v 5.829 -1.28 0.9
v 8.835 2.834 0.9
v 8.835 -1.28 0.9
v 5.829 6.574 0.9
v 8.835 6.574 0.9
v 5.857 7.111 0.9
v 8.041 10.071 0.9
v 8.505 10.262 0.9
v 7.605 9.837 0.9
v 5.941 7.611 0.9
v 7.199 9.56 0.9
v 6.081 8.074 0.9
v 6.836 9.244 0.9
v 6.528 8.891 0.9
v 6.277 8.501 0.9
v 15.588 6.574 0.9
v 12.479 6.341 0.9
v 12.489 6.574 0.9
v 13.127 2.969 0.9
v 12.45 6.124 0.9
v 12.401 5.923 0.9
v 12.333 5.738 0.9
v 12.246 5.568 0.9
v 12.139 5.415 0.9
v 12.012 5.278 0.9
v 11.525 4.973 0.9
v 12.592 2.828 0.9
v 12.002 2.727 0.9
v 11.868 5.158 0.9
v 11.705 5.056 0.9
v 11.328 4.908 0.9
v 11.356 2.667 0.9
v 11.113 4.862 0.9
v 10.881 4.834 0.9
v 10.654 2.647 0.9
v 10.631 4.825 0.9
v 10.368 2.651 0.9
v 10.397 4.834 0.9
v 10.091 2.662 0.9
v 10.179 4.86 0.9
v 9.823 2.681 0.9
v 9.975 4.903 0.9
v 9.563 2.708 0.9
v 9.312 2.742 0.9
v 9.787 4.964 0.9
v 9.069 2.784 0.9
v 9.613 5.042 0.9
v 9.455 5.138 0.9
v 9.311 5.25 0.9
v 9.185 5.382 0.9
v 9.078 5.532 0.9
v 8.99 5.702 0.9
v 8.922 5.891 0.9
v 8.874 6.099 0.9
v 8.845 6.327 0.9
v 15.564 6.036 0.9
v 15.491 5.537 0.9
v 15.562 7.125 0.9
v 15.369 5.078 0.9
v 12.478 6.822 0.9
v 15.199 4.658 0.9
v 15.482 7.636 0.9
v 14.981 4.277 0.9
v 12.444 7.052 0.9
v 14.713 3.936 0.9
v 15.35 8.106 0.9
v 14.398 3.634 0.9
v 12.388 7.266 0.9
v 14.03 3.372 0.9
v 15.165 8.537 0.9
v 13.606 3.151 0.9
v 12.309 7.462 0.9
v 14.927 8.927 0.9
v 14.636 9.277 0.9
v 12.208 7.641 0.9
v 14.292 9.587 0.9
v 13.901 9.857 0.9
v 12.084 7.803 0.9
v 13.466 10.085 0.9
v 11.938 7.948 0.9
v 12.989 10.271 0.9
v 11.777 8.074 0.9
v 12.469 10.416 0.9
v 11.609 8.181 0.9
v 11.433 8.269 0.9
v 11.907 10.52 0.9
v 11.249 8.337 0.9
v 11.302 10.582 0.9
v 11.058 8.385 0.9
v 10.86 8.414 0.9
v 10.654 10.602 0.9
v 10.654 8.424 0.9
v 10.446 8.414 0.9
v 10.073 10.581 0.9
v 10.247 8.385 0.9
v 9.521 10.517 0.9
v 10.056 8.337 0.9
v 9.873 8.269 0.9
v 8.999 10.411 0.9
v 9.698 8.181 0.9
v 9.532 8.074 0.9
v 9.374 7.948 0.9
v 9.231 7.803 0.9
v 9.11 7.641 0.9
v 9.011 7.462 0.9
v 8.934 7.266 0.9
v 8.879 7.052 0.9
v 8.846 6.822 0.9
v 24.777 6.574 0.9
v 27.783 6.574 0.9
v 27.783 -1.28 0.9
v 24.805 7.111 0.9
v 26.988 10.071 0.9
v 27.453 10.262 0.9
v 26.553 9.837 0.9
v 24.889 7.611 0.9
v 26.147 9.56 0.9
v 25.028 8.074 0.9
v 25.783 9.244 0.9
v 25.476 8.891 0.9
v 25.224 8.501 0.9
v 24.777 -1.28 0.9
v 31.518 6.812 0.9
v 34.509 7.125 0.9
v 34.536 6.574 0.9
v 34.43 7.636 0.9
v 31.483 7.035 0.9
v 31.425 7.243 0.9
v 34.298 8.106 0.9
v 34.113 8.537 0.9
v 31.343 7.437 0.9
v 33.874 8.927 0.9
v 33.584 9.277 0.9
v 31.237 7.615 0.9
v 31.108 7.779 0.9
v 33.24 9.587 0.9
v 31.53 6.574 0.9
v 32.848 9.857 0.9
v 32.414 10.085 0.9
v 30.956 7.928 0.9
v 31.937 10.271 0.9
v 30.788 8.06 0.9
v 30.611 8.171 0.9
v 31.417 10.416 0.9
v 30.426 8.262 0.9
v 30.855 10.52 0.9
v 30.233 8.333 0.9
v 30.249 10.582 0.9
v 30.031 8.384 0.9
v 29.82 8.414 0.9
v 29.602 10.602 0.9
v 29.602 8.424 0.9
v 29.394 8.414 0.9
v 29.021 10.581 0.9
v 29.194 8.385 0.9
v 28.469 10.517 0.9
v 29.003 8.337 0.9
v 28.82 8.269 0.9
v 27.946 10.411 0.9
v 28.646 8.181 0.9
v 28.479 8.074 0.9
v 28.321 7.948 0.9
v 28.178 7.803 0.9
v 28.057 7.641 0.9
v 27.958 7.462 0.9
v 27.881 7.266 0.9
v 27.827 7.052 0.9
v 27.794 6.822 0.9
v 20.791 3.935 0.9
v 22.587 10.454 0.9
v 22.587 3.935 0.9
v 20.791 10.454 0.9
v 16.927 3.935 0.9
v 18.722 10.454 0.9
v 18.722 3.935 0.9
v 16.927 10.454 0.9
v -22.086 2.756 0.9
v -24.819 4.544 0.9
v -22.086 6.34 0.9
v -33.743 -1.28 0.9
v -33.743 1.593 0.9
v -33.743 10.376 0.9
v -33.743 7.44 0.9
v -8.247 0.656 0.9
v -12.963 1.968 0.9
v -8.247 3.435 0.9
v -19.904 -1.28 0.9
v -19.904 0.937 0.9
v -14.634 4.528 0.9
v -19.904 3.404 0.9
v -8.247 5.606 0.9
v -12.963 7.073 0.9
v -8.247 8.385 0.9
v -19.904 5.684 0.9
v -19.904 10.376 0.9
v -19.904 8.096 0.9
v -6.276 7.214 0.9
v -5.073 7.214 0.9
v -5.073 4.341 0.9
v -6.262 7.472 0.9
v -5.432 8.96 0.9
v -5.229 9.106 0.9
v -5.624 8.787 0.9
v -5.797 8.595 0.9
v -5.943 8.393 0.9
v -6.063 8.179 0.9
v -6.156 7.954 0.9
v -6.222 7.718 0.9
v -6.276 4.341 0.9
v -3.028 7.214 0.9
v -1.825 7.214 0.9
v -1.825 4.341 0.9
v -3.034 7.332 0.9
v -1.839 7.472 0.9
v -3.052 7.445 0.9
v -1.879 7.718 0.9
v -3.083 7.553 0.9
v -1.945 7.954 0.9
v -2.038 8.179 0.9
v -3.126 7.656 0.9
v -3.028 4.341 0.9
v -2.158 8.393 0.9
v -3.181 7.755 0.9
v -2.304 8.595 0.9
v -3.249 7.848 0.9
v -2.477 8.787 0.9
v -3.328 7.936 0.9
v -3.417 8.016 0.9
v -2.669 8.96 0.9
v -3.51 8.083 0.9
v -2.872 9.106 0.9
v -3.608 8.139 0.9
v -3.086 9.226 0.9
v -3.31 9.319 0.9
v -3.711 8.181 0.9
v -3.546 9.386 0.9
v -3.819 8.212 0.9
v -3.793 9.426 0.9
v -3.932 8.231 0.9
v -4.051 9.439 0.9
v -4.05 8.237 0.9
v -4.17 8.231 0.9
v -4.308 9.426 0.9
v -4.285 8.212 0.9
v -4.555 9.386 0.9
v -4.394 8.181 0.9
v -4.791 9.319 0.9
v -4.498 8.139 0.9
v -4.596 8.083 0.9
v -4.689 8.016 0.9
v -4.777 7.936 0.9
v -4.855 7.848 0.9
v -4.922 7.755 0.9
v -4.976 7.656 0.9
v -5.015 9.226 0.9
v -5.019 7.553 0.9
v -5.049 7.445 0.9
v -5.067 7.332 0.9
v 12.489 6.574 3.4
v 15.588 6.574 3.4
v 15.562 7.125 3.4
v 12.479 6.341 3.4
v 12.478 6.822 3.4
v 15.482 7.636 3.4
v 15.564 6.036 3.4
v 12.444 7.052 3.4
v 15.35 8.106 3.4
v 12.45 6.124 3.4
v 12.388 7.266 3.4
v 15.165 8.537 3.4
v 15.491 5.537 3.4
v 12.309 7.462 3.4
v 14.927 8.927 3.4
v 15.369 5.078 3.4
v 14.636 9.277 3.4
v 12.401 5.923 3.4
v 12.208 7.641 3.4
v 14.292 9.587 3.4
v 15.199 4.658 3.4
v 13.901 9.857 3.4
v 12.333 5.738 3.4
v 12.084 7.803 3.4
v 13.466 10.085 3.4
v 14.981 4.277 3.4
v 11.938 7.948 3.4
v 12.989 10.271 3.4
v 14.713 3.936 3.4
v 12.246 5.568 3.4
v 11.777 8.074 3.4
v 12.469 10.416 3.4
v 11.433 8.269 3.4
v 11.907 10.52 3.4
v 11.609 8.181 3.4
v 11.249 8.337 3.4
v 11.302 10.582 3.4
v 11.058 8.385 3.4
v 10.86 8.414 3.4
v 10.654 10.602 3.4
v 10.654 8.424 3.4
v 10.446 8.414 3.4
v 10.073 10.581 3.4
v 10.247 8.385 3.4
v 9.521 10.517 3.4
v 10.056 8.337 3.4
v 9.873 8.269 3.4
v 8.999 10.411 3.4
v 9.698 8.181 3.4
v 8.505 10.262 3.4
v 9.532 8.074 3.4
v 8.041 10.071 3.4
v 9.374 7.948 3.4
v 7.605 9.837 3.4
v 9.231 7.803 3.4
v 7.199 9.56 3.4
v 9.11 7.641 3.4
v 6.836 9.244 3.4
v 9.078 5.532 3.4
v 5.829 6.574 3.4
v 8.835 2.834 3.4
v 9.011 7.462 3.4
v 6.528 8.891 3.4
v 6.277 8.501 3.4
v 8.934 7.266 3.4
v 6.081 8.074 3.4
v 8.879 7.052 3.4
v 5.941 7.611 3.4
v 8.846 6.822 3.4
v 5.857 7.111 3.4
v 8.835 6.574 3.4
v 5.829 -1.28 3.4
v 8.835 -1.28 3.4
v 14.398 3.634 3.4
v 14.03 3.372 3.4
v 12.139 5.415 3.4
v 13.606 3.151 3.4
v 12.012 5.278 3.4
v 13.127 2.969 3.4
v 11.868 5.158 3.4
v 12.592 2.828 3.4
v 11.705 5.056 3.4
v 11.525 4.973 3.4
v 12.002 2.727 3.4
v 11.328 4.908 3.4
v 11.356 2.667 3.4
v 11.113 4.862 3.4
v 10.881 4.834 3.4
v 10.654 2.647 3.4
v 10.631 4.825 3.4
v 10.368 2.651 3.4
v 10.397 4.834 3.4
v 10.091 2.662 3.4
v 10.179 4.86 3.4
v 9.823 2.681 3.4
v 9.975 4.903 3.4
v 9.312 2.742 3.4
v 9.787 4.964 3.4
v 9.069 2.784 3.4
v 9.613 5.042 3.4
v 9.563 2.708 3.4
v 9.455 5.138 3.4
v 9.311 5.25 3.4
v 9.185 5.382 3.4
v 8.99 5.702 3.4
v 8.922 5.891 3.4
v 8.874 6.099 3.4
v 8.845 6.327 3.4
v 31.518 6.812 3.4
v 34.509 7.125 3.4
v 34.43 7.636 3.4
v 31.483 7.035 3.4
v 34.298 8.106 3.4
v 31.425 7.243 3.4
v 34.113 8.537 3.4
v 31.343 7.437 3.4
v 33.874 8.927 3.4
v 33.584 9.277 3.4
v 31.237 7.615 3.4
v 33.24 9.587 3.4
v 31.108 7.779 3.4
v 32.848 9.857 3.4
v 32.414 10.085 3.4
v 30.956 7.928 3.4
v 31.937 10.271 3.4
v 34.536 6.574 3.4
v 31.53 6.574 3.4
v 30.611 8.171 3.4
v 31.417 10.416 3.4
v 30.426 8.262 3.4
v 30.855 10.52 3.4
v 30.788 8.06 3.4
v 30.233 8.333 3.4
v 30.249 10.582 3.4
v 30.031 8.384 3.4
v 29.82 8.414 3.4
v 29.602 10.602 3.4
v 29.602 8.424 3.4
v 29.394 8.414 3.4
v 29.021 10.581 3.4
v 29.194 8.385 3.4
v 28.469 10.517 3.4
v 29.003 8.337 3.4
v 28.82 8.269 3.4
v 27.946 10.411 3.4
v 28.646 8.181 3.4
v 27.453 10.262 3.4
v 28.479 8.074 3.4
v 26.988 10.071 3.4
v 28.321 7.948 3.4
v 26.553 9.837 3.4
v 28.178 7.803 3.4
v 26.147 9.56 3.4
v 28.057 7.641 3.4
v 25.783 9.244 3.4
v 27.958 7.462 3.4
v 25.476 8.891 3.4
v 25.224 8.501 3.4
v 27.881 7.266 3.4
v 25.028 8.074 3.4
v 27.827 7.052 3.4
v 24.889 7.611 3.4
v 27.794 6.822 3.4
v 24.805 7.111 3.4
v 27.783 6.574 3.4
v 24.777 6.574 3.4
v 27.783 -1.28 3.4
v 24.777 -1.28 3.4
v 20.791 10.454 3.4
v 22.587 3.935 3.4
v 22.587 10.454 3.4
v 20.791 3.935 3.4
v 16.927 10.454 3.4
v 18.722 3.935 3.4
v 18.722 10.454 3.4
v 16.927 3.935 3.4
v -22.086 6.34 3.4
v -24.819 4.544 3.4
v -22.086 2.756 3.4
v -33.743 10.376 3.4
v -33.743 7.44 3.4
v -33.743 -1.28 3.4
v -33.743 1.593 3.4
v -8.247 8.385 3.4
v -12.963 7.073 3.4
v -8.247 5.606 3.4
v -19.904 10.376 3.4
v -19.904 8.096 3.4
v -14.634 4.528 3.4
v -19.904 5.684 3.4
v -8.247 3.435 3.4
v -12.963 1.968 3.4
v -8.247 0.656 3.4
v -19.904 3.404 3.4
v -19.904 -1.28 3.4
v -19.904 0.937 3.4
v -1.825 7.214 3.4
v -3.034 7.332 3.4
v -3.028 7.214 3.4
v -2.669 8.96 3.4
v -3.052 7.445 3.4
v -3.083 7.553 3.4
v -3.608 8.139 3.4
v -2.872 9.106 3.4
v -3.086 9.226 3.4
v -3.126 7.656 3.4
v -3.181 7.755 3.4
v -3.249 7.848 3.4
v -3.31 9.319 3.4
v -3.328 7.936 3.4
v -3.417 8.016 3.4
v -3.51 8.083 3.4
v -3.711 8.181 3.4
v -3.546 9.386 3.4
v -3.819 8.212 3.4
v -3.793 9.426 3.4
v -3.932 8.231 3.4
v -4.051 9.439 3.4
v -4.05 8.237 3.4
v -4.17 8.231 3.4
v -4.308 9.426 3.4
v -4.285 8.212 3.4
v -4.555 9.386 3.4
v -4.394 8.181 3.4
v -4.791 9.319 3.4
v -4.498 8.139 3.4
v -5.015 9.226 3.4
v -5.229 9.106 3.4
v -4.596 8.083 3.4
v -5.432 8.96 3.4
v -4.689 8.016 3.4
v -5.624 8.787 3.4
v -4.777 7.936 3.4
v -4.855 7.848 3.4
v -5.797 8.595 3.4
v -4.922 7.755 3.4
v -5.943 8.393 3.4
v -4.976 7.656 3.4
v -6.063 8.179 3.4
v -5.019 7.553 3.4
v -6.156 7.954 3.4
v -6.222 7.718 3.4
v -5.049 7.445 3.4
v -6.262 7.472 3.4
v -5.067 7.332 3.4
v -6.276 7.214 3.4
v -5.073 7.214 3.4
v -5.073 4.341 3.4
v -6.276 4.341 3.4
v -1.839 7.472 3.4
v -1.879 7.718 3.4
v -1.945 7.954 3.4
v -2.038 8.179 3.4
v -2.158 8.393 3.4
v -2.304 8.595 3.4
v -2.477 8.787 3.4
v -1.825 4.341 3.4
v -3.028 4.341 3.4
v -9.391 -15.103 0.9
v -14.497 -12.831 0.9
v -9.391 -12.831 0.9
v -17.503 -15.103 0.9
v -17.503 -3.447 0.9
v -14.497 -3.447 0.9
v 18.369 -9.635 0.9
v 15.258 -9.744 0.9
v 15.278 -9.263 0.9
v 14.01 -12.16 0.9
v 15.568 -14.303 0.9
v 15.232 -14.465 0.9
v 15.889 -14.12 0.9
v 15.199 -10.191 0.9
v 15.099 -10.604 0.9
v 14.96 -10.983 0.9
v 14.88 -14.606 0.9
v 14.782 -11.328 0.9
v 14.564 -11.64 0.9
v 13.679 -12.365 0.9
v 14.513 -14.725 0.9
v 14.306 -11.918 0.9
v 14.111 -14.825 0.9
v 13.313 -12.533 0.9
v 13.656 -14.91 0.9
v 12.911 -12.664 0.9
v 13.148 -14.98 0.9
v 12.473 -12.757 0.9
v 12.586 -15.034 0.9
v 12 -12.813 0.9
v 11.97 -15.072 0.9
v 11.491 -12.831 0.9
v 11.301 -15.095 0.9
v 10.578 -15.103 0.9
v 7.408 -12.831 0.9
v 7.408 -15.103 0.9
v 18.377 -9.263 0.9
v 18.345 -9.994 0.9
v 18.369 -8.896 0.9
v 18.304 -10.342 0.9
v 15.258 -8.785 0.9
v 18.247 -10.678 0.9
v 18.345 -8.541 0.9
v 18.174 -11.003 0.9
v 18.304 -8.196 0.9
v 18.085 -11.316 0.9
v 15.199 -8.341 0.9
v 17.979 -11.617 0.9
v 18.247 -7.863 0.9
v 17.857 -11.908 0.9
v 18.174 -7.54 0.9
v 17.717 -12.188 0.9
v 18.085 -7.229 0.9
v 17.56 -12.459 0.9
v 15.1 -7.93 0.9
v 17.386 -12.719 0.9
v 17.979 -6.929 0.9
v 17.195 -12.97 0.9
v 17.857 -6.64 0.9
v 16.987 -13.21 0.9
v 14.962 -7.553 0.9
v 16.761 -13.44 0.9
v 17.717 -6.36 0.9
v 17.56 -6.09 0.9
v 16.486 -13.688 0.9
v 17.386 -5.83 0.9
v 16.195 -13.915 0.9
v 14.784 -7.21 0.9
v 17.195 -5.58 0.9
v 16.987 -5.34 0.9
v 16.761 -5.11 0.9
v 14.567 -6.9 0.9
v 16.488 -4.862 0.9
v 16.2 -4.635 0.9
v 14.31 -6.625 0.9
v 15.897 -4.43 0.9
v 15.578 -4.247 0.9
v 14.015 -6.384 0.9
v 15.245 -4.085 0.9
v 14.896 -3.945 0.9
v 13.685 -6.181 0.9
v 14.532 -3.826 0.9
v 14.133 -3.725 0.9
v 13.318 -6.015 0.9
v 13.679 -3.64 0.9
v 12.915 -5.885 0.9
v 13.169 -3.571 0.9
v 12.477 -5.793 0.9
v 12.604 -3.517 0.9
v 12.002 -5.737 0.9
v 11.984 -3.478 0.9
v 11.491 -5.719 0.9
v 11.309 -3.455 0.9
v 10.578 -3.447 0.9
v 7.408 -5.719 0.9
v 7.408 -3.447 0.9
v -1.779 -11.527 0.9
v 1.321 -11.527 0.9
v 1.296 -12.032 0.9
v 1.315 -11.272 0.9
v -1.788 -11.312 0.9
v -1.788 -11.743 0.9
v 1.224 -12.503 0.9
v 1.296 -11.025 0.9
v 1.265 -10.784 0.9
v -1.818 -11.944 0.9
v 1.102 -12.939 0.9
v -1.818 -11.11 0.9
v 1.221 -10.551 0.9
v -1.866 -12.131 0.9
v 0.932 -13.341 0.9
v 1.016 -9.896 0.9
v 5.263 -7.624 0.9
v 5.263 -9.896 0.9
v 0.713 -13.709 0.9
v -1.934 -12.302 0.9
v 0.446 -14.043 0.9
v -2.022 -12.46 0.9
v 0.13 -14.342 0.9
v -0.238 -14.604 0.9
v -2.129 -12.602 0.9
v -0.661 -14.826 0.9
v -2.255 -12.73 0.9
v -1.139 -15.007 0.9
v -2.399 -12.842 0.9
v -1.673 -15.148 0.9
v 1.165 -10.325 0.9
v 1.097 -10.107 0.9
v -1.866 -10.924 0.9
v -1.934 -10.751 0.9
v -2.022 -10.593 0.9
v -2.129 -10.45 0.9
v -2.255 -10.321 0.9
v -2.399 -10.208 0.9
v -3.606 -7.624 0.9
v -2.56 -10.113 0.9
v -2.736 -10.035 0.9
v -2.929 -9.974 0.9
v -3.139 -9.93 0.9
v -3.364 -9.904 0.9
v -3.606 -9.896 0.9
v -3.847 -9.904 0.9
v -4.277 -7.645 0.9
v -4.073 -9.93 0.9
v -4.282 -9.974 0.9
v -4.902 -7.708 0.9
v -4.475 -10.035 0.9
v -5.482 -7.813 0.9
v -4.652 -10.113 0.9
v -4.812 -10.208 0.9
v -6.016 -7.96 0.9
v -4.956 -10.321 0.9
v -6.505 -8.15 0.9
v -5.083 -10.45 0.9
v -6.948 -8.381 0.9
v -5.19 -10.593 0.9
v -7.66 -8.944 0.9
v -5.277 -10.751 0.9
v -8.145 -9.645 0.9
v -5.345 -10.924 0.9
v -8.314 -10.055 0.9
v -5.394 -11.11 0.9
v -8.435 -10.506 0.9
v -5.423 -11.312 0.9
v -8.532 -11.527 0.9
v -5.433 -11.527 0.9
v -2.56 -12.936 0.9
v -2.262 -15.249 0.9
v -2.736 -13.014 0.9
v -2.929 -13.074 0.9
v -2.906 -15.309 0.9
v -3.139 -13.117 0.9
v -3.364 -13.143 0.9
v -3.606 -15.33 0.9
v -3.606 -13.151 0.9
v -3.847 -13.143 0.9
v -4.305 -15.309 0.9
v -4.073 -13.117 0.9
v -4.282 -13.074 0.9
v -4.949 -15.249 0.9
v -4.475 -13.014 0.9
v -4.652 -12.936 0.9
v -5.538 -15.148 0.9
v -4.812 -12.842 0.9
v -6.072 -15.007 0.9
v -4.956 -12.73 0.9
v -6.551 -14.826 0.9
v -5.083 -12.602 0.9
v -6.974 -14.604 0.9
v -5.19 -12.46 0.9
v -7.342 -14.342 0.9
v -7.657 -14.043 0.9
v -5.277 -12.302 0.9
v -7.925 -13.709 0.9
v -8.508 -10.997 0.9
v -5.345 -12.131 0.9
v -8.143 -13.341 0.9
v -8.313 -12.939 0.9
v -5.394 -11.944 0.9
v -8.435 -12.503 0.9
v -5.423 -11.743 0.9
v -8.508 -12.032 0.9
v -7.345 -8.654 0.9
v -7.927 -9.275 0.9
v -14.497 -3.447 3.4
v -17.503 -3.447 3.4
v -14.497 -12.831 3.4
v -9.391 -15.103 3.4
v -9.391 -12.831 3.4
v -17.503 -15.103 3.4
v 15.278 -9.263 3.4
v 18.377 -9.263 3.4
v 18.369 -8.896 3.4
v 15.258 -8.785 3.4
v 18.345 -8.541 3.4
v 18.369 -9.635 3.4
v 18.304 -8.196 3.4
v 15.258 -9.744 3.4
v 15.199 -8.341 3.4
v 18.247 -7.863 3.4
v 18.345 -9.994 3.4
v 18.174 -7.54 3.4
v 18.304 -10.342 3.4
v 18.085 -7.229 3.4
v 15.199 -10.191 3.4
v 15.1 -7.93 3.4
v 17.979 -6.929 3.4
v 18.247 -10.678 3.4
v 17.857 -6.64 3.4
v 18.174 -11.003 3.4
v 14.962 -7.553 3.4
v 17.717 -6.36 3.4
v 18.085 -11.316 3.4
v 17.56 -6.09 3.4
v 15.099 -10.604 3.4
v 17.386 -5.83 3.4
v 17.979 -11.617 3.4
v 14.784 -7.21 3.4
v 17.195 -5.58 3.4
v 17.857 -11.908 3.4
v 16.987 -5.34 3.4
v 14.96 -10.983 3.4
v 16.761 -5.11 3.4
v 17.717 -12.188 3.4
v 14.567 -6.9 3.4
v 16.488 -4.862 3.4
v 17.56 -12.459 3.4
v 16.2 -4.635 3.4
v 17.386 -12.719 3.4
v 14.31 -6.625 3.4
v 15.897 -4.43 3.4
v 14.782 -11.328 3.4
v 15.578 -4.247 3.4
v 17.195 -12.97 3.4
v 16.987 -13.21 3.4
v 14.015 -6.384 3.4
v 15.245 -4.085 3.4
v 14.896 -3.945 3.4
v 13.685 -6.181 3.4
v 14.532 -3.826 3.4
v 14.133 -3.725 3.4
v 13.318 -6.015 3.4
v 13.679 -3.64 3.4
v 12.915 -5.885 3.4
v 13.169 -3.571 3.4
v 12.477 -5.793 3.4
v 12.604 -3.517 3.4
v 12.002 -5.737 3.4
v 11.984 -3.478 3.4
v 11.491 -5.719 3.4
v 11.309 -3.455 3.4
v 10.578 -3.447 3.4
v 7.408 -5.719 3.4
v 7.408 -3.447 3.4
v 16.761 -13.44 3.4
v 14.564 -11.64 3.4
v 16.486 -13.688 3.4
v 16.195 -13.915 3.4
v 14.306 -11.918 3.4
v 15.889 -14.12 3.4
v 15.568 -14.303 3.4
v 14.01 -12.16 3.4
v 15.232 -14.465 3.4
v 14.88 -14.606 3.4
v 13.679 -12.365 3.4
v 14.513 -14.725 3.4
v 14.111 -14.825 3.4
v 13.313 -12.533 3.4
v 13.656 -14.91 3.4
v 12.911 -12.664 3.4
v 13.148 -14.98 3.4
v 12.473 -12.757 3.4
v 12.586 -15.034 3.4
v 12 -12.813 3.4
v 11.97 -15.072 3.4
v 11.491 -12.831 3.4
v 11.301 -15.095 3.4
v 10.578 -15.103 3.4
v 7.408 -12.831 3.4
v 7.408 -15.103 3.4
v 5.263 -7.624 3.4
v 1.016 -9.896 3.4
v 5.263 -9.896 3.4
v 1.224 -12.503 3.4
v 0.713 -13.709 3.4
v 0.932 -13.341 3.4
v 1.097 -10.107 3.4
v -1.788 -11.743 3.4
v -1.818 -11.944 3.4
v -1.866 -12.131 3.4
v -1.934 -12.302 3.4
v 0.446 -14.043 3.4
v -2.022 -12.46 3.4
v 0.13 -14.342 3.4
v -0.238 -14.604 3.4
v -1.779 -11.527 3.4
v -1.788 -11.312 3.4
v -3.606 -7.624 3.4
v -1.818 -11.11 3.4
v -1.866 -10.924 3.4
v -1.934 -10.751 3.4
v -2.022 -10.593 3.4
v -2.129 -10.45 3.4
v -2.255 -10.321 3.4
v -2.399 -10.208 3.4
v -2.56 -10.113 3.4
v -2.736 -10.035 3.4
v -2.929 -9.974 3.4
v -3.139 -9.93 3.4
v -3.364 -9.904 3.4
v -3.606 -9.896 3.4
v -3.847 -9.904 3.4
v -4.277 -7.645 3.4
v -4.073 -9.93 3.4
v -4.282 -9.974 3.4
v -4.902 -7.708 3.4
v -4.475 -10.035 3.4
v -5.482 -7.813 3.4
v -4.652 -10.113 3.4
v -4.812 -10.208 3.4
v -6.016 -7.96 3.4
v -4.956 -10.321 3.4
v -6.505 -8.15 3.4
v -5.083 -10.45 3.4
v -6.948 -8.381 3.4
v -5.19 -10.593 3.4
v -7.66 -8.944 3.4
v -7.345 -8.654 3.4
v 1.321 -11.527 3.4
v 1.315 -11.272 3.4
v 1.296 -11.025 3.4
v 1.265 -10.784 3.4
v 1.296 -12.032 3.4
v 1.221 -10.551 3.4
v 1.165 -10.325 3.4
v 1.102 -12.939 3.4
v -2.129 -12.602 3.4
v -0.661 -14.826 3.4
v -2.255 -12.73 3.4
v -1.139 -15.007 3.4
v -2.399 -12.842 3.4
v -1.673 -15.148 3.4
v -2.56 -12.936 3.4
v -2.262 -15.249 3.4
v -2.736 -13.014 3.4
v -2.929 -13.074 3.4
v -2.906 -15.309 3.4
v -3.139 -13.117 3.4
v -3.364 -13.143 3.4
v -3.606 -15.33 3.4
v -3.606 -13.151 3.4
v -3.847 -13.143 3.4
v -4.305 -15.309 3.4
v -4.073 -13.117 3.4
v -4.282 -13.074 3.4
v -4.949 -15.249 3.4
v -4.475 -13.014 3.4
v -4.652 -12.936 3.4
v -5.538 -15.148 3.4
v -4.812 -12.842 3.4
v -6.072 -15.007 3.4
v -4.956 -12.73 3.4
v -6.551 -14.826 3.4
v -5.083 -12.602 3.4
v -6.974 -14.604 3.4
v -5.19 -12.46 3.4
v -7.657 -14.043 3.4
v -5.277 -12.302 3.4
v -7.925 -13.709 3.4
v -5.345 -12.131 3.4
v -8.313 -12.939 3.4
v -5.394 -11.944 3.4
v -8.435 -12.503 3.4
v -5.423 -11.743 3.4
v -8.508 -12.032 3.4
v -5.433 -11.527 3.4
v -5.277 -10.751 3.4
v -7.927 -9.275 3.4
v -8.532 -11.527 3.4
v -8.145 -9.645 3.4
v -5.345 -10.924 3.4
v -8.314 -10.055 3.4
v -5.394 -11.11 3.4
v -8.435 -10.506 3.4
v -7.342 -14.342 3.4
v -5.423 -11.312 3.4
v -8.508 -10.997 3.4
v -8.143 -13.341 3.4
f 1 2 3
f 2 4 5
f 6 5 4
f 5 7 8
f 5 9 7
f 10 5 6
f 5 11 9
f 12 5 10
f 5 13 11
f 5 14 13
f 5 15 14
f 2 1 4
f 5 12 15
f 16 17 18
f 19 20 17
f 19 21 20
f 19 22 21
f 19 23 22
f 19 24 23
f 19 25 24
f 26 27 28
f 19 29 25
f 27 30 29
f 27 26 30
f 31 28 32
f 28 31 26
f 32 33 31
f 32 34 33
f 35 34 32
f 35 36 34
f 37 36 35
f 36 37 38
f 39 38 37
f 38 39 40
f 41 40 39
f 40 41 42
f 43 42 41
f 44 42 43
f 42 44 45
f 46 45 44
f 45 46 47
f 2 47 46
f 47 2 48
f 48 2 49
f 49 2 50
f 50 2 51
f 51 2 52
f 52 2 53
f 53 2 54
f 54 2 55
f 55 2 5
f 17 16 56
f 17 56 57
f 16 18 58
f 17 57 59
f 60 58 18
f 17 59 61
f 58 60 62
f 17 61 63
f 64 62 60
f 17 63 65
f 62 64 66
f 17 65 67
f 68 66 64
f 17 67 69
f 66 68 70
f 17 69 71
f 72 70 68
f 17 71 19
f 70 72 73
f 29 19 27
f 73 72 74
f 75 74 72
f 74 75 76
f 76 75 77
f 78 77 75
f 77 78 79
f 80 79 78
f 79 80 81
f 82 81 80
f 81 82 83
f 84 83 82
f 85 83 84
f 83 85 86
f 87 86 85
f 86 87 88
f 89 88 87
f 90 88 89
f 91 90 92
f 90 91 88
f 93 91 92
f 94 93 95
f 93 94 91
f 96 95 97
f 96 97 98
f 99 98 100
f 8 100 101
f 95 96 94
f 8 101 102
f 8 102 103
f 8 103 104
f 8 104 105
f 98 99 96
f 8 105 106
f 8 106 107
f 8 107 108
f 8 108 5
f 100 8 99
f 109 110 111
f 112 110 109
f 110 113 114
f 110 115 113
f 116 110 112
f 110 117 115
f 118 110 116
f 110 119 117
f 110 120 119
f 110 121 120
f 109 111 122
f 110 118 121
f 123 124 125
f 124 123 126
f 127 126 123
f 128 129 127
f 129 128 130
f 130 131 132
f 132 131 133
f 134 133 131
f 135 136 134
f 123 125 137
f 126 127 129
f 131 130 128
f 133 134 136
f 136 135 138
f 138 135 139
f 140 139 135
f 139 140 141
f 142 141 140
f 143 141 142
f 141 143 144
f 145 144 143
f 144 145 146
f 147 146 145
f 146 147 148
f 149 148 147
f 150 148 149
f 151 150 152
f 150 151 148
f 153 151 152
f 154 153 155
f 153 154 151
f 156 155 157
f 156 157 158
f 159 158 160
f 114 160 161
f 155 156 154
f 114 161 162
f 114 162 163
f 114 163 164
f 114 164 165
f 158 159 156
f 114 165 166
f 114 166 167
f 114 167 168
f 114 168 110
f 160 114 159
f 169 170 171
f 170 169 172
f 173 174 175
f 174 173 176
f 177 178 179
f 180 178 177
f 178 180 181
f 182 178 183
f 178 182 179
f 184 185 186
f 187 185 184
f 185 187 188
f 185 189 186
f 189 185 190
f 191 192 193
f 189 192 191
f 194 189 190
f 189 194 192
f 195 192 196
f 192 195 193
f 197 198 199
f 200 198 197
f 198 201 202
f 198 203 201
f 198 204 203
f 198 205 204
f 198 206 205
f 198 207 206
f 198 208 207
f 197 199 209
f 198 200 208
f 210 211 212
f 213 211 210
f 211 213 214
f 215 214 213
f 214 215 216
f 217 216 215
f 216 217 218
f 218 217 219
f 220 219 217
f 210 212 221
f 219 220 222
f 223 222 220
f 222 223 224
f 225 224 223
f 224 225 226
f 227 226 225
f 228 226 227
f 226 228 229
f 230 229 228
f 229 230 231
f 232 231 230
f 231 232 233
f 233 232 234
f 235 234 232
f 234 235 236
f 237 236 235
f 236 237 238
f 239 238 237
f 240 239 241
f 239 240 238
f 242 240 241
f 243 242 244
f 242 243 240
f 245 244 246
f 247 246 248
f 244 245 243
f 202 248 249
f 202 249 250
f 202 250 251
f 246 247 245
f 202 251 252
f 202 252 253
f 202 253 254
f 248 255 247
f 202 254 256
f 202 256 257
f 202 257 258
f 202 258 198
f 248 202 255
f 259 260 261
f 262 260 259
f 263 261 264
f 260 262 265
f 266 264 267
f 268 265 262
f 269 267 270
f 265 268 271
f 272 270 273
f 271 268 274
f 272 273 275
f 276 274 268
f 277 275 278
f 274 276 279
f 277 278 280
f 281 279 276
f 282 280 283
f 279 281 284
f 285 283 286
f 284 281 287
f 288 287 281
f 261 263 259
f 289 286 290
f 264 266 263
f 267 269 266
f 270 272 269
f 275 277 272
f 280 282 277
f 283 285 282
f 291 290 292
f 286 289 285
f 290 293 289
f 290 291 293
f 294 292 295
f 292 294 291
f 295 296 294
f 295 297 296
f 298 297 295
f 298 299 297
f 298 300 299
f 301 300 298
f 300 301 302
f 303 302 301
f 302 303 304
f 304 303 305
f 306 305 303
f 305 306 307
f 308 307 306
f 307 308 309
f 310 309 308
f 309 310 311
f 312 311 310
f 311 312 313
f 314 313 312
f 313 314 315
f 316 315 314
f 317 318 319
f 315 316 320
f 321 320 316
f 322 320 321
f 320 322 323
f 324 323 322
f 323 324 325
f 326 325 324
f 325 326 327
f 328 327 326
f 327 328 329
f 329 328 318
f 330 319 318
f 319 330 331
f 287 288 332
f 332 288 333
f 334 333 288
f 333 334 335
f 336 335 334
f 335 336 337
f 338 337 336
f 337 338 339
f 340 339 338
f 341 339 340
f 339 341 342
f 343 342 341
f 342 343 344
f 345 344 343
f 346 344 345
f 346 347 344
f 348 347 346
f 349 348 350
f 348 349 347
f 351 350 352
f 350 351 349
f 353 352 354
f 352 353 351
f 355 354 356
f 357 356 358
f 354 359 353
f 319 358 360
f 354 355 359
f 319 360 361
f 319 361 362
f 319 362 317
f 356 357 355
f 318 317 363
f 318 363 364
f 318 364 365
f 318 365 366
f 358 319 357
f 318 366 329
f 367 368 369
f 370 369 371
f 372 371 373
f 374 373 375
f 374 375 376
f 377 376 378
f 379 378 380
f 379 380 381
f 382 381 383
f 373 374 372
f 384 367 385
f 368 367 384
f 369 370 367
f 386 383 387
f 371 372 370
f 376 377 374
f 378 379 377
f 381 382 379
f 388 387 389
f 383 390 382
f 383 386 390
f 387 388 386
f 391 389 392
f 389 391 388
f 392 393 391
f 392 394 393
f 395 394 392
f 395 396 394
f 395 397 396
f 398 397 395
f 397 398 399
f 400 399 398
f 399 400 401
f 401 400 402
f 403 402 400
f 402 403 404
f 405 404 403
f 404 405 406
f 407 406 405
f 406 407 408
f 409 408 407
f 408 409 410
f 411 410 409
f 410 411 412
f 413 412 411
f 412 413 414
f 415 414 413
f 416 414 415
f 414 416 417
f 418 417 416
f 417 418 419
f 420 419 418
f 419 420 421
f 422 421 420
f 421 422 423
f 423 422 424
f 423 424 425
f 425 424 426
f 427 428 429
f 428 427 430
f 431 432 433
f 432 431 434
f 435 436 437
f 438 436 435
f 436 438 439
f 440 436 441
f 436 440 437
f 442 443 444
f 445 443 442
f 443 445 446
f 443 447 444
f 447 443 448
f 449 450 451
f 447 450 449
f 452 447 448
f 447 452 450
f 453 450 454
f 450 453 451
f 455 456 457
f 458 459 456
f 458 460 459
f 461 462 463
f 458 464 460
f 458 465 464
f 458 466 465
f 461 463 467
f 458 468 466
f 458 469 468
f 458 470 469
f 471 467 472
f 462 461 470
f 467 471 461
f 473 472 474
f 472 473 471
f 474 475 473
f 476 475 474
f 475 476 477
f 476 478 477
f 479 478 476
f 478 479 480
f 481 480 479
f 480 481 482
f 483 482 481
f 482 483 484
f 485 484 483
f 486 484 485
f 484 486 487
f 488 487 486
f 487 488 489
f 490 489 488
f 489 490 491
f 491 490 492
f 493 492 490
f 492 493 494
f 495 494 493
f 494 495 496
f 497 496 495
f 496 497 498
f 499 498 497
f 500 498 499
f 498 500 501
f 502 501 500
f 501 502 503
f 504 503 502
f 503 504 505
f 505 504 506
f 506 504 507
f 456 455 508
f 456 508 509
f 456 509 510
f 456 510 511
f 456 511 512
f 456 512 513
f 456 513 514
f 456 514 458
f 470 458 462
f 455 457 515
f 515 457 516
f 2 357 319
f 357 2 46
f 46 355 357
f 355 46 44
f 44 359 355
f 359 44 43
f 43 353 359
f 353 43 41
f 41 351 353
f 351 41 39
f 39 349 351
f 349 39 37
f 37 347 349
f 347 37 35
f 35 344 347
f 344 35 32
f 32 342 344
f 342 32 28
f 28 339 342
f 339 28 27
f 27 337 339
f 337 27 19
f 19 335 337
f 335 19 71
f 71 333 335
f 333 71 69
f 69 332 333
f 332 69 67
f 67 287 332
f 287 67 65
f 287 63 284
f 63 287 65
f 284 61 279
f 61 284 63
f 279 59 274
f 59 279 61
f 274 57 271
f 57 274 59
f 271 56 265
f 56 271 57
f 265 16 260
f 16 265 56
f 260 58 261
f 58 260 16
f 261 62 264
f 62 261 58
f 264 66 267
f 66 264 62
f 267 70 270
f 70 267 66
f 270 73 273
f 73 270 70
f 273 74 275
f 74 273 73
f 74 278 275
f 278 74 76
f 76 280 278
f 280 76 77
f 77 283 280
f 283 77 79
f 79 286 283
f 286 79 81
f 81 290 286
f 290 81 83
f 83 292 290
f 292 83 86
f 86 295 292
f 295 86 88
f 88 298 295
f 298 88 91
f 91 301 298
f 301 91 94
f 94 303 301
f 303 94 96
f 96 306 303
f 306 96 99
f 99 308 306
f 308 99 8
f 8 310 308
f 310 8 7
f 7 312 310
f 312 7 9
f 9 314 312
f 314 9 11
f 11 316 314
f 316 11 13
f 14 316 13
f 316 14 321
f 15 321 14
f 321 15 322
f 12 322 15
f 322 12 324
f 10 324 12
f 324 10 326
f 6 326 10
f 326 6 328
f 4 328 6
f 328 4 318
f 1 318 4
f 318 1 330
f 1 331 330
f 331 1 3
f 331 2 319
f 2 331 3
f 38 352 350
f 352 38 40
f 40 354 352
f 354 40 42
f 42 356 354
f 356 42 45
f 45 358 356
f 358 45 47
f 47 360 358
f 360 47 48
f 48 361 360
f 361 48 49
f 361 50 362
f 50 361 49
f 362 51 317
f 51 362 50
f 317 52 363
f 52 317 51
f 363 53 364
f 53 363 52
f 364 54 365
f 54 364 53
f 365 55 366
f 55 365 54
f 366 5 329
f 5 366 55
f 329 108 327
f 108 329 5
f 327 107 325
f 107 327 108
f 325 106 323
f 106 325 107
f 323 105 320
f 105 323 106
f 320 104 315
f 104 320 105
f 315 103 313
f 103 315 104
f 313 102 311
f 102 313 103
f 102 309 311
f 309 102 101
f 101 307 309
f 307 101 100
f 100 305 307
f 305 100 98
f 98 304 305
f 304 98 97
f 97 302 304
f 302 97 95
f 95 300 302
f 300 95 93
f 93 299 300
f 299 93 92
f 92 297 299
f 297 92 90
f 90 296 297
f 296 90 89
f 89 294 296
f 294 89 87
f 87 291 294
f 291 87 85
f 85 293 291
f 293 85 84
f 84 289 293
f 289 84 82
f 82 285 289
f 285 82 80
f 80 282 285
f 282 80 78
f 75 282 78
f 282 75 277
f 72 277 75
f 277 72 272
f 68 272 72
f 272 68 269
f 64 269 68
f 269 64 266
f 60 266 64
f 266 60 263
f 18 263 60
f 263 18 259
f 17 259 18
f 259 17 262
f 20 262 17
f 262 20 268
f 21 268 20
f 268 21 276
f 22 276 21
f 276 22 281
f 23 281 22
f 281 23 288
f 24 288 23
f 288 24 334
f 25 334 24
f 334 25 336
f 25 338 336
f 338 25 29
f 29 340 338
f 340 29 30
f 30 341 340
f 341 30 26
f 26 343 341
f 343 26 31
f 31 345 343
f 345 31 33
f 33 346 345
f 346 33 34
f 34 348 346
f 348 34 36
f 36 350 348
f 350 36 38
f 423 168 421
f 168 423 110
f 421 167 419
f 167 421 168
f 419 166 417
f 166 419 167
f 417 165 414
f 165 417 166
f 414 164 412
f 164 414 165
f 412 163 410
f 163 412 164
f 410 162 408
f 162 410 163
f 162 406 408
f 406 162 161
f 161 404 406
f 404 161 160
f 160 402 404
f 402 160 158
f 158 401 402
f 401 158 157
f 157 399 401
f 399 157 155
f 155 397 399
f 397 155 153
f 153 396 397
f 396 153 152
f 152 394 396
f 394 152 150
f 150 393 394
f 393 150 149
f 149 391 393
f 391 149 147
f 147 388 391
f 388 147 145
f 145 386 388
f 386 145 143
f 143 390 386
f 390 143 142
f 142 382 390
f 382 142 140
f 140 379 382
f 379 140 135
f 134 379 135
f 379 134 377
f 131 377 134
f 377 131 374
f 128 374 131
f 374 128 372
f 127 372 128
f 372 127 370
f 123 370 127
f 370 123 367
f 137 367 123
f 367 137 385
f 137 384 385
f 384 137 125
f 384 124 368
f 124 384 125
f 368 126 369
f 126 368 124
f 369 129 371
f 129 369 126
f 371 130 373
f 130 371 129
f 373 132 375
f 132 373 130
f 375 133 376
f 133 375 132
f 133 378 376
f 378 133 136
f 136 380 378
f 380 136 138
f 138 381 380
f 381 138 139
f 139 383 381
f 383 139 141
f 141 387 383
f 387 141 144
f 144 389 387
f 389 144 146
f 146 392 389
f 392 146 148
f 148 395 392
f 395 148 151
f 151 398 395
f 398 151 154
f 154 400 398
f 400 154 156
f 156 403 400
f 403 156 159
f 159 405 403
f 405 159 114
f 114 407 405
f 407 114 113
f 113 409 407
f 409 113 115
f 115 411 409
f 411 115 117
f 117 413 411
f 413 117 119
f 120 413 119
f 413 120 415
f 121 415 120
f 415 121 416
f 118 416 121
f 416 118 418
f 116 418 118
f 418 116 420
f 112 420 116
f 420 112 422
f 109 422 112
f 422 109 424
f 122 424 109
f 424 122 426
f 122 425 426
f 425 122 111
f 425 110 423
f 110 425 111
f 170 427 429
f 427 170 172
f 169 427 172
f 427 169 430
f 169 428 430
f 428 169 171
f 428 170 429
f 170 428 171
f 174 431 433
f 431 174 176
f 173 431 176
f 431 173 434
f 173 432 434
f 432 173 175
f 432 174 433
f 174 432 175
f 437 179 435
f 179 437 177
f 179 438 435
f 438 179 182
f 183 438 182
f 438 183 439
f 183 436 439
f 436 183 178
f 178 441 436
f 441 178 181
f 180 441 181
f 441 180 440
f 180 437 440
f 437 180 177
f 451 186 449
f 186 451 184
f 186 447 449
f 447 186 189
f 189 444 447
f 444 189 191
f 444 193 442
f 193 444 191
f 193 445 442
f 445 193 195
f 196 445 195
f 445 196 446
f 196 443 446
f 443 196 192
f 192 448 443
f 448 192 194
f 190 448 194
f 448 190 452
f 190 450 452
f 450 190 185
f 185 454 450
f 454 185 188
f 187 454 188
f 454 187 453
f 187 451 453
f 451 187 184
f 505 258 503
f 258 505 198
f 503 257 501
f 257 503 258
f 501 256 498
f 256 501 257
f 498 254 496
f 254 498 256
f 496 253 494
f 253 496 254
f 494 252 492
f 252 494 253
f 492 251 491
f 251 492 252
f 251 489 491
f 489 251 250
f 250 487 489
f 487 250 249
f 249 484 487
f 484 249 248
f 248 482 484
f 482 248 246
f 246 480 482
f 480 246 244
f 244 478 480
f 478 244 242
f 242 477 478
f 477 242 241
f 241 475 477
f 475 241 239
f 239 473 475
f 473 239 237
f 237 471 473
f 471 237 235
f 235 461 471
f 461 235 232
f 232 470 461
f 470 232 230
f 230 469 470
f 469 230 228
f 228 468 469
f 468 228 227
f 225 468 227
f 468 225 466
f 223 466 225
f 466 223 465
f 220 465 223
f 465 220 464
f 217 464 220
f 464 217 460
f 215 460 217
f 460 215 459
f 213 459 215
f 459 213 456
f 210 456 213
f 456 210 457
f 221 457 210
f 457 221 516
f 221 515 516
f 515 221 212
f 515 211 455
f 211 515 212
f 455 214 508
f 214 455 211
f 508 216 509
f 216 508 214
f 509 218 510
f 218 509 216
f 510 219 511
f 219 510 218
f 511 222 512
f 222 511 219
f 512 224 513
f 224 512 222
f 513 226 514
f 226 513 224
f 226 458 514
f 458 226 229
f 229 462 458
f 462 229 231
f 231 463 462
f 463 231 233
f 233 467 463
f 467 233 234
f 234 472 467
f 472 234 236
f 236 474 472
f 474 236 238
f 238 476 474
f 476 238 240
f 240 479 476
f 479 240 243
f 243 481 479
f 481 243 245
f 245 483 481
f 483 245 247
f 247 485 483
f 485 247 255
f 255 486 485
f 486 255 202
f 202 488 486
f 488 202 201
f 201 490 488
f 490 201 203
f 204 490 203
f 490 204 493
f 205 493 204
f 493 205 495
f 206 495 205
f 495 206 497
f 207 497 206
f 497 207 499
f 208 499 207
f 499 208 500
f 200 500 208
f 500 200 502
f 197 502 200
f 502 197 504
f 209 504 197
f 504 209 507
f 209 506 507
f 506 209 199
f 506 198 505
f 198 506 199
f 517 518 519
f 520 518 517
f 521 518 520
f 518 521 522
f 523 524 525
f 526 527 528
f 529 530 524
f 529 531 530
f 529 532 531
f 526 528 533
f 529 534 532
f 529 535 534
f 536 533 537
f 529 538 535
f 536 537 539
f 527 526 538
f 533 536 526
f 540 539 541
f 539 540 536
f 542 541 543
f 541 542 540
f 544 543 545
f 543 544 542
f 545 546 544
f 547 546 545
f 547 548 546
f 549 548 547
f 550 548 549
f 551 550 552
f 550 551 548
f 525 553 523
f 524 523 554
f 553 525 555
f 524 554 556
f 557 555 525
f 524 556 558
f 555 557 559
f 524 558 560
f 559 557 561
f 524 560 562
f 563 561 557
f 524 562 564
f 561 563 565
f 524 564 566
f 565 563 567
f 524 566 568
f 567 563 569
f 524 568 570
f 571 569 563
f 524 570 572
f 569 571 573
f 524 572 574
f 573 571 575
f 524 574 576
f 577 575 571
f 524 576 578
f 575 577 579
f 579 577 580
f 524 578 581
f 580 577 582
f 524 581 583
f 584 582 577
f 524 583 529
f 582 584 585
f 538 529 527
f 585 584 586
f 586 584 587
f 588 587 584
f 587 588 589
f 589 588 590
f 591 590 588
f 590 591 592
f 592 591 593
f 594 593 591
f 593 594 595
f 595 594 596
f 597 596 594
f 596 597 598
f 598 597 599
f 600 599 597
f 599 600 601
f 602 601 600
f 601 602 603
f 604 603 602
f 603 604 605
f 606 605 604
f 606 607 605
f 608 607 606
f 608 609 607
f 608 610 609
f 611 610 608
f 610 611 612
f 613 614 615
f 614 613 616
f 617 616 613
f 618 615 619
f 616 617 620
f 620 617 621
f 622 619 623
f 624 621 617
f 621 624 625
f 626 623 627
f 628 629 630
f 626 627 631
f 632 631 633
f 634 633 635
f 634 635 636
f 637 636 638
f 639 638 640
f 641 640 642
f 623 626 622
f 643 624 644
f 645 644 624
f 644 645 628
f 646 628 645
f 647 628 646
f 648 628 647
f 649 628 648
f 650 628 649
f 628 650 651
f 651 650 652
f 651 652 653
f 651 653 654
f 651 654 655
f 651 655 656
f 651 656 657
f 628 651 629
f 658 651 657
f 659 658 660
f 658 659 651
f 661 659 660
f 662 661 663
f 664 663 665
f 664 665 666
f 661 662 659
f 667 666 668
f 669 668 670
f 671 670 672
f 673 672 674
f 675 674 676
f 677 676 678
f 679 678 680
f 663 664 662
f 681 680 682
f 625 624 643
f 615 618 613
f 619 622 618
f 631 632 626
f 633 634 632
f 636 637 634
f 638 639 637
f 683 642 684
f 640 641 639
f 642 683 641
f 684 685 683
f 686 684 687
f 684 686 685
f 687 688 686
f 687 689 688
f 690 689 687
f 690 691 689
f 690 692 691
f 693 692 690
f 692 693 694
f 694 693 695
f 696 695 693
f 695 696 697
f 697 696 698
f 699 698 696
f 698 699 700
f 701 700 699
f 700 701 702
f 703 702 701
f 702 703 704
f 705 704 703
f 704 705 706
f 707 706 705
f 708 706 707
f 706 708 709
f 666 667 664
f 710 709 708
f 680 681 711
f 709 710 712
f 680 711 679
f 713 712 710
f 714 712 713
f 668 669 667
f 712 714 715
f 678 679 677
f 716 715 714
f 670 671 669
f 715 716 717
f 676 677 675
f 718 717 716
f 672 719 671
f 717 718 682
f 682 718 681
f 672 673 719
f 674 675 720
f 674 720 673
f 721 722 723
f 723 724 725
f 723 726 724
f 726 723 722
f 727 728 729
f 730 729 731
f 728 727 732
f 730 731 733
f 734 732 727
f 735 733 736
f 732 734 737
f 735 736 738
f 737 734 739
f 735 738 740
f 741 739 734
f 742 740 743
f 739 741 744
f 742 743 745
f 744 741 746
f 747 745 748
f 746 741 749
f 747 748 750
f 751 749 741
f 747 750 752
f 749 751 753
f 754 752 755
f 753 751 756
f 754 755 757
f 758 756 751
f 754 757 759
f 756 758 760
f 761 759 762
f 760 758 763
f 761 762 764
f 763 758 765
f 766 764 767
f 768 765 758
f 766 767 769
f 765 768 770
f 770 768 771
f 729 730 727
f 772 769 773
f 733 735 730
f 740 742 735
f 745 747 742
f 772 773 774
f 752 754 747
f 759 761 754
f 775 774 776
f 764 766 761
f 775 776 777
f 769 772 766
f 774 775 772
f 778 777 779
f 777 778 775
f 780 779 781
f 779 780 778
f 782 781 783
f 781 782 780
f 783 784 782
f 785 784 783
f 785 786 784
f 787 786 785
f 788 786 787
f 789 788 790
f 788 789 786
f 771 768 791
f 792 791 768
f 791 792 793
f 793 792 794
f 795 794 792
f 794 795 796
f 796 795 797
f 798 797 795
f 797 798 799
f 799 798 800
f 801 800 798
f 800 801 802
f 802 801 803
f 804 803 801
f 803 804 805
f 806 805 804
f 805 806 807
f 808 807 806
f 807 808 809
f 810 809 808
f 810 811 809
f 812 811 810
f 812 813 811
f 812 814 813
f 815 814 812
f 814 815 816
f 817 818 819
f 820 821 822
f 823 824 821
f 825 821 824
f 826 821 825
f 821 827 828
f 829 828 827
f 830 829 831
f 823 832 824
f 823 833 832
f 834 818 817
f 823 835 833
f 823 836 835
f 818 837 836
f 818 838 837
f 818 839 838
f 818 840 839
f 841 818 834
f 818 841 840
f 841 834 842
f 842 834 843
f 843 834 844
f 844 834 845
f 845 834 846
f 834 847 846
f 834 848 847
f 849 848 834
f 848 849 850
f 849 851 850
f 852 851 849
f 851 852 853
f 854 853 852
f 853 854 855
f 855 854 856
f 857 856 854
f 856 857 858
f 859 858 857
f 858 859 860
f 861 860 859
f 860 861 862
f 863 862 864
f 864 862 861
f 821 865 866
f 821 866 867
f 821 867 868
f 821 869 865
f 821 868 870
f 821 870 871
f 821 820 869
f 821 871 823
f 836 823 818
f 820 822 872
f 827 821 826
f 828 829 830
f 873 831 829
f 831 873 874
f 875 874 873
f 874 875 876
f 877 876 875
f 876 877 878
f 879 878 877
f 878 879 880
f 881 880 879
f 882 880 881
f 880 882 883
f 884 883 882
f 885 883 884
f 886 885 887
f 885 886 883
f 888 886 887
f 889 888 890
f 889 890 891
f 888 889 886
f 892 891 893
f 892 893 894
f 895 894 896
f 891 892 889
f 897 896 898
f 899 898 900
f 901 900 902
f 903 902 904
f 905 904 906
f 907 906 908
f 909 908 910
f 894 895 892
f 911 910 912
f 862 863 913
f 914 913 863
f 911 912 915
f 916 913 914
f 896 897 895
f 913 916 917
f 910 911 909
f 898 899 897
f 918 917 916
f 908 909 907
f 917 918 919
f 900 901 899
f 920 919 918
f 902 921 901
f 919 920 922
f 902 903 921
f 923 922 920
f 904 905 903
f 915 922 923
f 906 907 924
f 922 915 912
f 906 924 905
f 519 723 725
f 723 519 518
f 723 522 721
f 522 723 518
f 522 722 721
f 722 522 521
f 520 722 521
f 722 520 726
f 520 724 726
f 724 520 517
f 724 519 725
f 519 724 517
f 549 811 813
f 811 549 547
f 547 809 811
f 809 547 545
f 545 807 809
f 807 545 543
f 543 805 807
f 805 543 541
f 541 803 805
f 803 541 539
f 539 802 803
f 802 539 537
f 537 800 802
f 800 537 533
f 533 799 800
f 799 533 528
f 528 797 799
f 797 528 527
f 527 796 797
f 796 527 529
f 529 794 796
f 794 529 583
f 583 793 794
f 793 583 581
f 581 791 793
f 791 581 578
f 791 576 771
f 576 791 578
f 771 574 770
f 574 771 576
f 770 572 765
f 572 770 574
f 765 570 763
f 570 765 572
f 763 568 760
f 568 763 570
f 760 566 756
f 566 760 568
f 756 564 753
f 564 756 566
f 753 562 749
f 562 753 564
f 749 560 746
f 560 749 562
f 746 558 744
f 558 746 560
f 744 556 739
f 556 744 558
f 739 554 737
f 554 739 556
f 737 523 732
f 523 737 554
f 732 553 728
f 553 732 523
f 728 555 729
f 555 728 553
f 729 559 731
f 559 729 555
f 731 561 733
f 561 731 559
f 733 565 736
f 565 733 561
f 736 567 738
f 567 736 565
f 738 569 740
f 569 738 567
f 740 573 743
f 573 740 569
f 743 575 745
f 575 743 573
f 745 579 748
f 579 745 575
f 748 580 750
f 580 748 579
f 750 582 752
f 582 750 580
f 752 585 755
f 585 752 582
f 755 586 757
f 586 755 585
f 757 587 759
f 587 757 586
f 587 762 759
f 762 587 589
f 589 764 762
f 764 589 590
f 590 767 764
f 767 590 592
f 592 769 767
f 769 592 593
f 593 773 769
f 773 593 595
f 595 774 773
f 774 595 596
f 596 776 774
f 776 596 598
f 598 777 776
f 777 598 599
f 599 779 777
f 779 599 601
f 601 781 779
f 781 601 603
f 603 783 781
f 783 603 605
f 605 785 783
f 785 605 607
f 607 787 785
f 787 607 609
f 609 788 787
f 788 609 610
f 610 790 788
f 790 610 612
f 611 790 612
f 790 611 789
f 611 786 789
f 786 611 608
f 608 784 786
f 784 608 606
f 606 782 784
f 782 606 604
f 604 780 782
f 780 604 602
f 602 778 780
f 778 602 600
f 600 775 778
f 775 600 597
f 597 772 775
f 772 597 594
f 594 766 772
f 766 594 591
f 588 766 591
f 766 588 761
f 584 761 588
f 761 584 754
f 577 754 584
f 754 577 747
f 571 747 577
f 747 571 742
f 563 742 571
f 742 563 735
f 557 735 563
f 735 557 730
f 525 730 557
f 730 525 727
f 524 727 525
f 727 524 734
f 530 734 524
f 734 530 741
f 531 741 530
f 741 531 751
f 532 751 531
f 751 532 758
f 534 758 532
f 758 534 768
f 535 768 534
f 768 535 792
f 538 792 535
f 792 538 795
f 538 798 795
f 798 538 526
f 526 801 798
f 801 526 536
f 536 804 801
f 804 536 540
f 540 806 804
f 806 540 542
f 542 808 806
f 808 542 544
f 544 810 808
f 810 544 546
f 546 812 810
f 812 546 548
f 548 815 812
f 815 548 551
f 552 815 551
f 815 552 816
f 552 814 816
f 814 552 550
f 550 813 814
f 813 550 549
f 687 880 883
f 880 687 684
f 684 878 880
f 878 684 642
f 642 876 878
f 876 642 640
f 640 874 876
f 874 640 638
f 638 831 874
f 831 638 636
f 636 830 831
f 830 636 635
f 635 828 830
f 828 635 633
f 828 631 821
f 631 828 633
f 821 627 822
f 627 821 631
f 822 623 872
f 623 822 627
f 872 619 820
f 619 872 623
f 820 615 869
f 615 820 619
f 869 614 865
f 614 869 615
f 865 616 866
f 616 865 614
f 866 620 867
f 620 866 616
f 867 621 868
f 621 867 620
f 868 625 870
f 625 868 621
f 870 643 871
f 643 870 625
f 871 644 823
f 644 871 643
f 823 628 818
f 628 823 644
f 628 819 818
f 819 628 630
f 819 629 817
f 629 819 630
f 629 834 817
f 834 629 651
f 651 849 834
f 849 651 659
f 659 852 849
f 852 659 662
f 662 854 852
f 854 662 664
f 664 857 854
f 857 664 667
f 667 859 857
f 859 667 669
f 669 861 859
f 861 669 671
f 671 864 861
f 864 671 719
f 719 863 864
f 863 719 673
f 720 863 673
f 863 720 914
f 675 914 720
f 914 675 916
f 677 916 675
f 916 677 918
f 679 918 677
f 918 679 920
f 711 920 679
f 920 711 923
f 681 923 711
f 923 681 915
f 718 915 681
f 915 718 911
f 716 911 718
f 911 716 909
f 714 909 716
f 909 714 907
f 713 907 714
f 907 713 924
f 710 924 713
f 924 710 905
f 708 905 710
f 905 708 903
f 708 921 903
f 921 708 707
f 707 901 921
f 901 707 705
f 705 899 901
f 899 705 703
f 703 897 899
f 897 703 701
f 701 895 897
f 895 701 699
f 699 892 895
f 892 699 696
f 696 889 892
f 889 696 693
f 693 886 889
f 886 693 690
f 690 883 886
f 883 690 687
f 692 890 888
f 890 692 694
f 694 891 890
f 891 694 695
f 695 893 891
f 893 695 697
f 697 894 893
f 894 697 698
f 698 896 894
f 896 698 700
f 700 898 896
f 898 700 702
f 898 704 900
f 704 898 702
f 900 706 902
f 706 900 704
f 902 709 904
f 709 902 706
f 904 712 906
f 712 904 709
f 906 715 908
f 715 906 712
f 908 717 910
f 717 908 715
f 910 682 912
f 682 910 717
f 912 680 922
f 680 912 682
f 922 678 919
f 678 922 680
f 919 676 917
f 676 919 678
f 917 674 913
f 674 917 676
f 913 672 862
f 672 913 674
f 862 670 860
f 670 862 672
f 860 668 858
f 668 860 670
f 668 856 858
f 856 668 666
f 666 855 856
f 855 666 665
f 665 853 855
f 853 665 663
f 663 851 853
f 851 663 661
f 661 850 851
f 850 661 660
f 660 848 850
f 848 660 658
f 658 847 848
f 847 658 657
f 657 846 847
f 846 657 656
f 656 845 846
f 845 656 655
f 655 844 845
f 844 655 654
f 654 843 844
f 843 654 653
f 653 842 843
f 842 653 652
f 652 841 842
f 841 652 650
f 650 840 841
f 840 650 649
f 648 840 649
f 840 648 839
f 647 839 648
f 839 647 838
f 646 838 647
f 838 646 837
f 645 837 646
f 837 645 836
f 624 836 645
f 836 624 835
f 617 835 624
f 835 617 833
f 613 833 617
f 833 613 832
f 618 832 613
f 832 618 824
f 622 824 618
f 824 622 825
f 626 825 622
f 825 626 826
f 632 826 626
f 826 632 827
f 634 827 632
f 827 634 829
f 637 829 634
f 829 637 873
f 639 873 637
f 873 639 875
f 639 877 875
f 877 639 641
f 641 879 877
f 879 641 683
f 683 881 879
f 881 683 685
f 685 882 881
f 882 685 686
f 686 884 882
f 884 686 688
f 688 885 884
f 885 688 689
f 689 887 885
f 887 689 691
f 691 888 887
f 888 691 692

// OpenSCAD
$fn = 48;
  // syllabics (overlaid on icon, tallest)
  translate([0, 4.523, 0.900]) linear_extrude(height=2.500) text("ᐳᕒᐢ ᑭᐦᒋ", size=11.513, halign="center", valign="center", font="Euphemia UCAS:style=Bold");
  translate([0, -9.523, 0.900]) linear_extrude(height=2.500) text("ᒪᓂᑐ", size=11.513, halign="center", valign="center", font="Euphemia UCAS:style=Bold");
